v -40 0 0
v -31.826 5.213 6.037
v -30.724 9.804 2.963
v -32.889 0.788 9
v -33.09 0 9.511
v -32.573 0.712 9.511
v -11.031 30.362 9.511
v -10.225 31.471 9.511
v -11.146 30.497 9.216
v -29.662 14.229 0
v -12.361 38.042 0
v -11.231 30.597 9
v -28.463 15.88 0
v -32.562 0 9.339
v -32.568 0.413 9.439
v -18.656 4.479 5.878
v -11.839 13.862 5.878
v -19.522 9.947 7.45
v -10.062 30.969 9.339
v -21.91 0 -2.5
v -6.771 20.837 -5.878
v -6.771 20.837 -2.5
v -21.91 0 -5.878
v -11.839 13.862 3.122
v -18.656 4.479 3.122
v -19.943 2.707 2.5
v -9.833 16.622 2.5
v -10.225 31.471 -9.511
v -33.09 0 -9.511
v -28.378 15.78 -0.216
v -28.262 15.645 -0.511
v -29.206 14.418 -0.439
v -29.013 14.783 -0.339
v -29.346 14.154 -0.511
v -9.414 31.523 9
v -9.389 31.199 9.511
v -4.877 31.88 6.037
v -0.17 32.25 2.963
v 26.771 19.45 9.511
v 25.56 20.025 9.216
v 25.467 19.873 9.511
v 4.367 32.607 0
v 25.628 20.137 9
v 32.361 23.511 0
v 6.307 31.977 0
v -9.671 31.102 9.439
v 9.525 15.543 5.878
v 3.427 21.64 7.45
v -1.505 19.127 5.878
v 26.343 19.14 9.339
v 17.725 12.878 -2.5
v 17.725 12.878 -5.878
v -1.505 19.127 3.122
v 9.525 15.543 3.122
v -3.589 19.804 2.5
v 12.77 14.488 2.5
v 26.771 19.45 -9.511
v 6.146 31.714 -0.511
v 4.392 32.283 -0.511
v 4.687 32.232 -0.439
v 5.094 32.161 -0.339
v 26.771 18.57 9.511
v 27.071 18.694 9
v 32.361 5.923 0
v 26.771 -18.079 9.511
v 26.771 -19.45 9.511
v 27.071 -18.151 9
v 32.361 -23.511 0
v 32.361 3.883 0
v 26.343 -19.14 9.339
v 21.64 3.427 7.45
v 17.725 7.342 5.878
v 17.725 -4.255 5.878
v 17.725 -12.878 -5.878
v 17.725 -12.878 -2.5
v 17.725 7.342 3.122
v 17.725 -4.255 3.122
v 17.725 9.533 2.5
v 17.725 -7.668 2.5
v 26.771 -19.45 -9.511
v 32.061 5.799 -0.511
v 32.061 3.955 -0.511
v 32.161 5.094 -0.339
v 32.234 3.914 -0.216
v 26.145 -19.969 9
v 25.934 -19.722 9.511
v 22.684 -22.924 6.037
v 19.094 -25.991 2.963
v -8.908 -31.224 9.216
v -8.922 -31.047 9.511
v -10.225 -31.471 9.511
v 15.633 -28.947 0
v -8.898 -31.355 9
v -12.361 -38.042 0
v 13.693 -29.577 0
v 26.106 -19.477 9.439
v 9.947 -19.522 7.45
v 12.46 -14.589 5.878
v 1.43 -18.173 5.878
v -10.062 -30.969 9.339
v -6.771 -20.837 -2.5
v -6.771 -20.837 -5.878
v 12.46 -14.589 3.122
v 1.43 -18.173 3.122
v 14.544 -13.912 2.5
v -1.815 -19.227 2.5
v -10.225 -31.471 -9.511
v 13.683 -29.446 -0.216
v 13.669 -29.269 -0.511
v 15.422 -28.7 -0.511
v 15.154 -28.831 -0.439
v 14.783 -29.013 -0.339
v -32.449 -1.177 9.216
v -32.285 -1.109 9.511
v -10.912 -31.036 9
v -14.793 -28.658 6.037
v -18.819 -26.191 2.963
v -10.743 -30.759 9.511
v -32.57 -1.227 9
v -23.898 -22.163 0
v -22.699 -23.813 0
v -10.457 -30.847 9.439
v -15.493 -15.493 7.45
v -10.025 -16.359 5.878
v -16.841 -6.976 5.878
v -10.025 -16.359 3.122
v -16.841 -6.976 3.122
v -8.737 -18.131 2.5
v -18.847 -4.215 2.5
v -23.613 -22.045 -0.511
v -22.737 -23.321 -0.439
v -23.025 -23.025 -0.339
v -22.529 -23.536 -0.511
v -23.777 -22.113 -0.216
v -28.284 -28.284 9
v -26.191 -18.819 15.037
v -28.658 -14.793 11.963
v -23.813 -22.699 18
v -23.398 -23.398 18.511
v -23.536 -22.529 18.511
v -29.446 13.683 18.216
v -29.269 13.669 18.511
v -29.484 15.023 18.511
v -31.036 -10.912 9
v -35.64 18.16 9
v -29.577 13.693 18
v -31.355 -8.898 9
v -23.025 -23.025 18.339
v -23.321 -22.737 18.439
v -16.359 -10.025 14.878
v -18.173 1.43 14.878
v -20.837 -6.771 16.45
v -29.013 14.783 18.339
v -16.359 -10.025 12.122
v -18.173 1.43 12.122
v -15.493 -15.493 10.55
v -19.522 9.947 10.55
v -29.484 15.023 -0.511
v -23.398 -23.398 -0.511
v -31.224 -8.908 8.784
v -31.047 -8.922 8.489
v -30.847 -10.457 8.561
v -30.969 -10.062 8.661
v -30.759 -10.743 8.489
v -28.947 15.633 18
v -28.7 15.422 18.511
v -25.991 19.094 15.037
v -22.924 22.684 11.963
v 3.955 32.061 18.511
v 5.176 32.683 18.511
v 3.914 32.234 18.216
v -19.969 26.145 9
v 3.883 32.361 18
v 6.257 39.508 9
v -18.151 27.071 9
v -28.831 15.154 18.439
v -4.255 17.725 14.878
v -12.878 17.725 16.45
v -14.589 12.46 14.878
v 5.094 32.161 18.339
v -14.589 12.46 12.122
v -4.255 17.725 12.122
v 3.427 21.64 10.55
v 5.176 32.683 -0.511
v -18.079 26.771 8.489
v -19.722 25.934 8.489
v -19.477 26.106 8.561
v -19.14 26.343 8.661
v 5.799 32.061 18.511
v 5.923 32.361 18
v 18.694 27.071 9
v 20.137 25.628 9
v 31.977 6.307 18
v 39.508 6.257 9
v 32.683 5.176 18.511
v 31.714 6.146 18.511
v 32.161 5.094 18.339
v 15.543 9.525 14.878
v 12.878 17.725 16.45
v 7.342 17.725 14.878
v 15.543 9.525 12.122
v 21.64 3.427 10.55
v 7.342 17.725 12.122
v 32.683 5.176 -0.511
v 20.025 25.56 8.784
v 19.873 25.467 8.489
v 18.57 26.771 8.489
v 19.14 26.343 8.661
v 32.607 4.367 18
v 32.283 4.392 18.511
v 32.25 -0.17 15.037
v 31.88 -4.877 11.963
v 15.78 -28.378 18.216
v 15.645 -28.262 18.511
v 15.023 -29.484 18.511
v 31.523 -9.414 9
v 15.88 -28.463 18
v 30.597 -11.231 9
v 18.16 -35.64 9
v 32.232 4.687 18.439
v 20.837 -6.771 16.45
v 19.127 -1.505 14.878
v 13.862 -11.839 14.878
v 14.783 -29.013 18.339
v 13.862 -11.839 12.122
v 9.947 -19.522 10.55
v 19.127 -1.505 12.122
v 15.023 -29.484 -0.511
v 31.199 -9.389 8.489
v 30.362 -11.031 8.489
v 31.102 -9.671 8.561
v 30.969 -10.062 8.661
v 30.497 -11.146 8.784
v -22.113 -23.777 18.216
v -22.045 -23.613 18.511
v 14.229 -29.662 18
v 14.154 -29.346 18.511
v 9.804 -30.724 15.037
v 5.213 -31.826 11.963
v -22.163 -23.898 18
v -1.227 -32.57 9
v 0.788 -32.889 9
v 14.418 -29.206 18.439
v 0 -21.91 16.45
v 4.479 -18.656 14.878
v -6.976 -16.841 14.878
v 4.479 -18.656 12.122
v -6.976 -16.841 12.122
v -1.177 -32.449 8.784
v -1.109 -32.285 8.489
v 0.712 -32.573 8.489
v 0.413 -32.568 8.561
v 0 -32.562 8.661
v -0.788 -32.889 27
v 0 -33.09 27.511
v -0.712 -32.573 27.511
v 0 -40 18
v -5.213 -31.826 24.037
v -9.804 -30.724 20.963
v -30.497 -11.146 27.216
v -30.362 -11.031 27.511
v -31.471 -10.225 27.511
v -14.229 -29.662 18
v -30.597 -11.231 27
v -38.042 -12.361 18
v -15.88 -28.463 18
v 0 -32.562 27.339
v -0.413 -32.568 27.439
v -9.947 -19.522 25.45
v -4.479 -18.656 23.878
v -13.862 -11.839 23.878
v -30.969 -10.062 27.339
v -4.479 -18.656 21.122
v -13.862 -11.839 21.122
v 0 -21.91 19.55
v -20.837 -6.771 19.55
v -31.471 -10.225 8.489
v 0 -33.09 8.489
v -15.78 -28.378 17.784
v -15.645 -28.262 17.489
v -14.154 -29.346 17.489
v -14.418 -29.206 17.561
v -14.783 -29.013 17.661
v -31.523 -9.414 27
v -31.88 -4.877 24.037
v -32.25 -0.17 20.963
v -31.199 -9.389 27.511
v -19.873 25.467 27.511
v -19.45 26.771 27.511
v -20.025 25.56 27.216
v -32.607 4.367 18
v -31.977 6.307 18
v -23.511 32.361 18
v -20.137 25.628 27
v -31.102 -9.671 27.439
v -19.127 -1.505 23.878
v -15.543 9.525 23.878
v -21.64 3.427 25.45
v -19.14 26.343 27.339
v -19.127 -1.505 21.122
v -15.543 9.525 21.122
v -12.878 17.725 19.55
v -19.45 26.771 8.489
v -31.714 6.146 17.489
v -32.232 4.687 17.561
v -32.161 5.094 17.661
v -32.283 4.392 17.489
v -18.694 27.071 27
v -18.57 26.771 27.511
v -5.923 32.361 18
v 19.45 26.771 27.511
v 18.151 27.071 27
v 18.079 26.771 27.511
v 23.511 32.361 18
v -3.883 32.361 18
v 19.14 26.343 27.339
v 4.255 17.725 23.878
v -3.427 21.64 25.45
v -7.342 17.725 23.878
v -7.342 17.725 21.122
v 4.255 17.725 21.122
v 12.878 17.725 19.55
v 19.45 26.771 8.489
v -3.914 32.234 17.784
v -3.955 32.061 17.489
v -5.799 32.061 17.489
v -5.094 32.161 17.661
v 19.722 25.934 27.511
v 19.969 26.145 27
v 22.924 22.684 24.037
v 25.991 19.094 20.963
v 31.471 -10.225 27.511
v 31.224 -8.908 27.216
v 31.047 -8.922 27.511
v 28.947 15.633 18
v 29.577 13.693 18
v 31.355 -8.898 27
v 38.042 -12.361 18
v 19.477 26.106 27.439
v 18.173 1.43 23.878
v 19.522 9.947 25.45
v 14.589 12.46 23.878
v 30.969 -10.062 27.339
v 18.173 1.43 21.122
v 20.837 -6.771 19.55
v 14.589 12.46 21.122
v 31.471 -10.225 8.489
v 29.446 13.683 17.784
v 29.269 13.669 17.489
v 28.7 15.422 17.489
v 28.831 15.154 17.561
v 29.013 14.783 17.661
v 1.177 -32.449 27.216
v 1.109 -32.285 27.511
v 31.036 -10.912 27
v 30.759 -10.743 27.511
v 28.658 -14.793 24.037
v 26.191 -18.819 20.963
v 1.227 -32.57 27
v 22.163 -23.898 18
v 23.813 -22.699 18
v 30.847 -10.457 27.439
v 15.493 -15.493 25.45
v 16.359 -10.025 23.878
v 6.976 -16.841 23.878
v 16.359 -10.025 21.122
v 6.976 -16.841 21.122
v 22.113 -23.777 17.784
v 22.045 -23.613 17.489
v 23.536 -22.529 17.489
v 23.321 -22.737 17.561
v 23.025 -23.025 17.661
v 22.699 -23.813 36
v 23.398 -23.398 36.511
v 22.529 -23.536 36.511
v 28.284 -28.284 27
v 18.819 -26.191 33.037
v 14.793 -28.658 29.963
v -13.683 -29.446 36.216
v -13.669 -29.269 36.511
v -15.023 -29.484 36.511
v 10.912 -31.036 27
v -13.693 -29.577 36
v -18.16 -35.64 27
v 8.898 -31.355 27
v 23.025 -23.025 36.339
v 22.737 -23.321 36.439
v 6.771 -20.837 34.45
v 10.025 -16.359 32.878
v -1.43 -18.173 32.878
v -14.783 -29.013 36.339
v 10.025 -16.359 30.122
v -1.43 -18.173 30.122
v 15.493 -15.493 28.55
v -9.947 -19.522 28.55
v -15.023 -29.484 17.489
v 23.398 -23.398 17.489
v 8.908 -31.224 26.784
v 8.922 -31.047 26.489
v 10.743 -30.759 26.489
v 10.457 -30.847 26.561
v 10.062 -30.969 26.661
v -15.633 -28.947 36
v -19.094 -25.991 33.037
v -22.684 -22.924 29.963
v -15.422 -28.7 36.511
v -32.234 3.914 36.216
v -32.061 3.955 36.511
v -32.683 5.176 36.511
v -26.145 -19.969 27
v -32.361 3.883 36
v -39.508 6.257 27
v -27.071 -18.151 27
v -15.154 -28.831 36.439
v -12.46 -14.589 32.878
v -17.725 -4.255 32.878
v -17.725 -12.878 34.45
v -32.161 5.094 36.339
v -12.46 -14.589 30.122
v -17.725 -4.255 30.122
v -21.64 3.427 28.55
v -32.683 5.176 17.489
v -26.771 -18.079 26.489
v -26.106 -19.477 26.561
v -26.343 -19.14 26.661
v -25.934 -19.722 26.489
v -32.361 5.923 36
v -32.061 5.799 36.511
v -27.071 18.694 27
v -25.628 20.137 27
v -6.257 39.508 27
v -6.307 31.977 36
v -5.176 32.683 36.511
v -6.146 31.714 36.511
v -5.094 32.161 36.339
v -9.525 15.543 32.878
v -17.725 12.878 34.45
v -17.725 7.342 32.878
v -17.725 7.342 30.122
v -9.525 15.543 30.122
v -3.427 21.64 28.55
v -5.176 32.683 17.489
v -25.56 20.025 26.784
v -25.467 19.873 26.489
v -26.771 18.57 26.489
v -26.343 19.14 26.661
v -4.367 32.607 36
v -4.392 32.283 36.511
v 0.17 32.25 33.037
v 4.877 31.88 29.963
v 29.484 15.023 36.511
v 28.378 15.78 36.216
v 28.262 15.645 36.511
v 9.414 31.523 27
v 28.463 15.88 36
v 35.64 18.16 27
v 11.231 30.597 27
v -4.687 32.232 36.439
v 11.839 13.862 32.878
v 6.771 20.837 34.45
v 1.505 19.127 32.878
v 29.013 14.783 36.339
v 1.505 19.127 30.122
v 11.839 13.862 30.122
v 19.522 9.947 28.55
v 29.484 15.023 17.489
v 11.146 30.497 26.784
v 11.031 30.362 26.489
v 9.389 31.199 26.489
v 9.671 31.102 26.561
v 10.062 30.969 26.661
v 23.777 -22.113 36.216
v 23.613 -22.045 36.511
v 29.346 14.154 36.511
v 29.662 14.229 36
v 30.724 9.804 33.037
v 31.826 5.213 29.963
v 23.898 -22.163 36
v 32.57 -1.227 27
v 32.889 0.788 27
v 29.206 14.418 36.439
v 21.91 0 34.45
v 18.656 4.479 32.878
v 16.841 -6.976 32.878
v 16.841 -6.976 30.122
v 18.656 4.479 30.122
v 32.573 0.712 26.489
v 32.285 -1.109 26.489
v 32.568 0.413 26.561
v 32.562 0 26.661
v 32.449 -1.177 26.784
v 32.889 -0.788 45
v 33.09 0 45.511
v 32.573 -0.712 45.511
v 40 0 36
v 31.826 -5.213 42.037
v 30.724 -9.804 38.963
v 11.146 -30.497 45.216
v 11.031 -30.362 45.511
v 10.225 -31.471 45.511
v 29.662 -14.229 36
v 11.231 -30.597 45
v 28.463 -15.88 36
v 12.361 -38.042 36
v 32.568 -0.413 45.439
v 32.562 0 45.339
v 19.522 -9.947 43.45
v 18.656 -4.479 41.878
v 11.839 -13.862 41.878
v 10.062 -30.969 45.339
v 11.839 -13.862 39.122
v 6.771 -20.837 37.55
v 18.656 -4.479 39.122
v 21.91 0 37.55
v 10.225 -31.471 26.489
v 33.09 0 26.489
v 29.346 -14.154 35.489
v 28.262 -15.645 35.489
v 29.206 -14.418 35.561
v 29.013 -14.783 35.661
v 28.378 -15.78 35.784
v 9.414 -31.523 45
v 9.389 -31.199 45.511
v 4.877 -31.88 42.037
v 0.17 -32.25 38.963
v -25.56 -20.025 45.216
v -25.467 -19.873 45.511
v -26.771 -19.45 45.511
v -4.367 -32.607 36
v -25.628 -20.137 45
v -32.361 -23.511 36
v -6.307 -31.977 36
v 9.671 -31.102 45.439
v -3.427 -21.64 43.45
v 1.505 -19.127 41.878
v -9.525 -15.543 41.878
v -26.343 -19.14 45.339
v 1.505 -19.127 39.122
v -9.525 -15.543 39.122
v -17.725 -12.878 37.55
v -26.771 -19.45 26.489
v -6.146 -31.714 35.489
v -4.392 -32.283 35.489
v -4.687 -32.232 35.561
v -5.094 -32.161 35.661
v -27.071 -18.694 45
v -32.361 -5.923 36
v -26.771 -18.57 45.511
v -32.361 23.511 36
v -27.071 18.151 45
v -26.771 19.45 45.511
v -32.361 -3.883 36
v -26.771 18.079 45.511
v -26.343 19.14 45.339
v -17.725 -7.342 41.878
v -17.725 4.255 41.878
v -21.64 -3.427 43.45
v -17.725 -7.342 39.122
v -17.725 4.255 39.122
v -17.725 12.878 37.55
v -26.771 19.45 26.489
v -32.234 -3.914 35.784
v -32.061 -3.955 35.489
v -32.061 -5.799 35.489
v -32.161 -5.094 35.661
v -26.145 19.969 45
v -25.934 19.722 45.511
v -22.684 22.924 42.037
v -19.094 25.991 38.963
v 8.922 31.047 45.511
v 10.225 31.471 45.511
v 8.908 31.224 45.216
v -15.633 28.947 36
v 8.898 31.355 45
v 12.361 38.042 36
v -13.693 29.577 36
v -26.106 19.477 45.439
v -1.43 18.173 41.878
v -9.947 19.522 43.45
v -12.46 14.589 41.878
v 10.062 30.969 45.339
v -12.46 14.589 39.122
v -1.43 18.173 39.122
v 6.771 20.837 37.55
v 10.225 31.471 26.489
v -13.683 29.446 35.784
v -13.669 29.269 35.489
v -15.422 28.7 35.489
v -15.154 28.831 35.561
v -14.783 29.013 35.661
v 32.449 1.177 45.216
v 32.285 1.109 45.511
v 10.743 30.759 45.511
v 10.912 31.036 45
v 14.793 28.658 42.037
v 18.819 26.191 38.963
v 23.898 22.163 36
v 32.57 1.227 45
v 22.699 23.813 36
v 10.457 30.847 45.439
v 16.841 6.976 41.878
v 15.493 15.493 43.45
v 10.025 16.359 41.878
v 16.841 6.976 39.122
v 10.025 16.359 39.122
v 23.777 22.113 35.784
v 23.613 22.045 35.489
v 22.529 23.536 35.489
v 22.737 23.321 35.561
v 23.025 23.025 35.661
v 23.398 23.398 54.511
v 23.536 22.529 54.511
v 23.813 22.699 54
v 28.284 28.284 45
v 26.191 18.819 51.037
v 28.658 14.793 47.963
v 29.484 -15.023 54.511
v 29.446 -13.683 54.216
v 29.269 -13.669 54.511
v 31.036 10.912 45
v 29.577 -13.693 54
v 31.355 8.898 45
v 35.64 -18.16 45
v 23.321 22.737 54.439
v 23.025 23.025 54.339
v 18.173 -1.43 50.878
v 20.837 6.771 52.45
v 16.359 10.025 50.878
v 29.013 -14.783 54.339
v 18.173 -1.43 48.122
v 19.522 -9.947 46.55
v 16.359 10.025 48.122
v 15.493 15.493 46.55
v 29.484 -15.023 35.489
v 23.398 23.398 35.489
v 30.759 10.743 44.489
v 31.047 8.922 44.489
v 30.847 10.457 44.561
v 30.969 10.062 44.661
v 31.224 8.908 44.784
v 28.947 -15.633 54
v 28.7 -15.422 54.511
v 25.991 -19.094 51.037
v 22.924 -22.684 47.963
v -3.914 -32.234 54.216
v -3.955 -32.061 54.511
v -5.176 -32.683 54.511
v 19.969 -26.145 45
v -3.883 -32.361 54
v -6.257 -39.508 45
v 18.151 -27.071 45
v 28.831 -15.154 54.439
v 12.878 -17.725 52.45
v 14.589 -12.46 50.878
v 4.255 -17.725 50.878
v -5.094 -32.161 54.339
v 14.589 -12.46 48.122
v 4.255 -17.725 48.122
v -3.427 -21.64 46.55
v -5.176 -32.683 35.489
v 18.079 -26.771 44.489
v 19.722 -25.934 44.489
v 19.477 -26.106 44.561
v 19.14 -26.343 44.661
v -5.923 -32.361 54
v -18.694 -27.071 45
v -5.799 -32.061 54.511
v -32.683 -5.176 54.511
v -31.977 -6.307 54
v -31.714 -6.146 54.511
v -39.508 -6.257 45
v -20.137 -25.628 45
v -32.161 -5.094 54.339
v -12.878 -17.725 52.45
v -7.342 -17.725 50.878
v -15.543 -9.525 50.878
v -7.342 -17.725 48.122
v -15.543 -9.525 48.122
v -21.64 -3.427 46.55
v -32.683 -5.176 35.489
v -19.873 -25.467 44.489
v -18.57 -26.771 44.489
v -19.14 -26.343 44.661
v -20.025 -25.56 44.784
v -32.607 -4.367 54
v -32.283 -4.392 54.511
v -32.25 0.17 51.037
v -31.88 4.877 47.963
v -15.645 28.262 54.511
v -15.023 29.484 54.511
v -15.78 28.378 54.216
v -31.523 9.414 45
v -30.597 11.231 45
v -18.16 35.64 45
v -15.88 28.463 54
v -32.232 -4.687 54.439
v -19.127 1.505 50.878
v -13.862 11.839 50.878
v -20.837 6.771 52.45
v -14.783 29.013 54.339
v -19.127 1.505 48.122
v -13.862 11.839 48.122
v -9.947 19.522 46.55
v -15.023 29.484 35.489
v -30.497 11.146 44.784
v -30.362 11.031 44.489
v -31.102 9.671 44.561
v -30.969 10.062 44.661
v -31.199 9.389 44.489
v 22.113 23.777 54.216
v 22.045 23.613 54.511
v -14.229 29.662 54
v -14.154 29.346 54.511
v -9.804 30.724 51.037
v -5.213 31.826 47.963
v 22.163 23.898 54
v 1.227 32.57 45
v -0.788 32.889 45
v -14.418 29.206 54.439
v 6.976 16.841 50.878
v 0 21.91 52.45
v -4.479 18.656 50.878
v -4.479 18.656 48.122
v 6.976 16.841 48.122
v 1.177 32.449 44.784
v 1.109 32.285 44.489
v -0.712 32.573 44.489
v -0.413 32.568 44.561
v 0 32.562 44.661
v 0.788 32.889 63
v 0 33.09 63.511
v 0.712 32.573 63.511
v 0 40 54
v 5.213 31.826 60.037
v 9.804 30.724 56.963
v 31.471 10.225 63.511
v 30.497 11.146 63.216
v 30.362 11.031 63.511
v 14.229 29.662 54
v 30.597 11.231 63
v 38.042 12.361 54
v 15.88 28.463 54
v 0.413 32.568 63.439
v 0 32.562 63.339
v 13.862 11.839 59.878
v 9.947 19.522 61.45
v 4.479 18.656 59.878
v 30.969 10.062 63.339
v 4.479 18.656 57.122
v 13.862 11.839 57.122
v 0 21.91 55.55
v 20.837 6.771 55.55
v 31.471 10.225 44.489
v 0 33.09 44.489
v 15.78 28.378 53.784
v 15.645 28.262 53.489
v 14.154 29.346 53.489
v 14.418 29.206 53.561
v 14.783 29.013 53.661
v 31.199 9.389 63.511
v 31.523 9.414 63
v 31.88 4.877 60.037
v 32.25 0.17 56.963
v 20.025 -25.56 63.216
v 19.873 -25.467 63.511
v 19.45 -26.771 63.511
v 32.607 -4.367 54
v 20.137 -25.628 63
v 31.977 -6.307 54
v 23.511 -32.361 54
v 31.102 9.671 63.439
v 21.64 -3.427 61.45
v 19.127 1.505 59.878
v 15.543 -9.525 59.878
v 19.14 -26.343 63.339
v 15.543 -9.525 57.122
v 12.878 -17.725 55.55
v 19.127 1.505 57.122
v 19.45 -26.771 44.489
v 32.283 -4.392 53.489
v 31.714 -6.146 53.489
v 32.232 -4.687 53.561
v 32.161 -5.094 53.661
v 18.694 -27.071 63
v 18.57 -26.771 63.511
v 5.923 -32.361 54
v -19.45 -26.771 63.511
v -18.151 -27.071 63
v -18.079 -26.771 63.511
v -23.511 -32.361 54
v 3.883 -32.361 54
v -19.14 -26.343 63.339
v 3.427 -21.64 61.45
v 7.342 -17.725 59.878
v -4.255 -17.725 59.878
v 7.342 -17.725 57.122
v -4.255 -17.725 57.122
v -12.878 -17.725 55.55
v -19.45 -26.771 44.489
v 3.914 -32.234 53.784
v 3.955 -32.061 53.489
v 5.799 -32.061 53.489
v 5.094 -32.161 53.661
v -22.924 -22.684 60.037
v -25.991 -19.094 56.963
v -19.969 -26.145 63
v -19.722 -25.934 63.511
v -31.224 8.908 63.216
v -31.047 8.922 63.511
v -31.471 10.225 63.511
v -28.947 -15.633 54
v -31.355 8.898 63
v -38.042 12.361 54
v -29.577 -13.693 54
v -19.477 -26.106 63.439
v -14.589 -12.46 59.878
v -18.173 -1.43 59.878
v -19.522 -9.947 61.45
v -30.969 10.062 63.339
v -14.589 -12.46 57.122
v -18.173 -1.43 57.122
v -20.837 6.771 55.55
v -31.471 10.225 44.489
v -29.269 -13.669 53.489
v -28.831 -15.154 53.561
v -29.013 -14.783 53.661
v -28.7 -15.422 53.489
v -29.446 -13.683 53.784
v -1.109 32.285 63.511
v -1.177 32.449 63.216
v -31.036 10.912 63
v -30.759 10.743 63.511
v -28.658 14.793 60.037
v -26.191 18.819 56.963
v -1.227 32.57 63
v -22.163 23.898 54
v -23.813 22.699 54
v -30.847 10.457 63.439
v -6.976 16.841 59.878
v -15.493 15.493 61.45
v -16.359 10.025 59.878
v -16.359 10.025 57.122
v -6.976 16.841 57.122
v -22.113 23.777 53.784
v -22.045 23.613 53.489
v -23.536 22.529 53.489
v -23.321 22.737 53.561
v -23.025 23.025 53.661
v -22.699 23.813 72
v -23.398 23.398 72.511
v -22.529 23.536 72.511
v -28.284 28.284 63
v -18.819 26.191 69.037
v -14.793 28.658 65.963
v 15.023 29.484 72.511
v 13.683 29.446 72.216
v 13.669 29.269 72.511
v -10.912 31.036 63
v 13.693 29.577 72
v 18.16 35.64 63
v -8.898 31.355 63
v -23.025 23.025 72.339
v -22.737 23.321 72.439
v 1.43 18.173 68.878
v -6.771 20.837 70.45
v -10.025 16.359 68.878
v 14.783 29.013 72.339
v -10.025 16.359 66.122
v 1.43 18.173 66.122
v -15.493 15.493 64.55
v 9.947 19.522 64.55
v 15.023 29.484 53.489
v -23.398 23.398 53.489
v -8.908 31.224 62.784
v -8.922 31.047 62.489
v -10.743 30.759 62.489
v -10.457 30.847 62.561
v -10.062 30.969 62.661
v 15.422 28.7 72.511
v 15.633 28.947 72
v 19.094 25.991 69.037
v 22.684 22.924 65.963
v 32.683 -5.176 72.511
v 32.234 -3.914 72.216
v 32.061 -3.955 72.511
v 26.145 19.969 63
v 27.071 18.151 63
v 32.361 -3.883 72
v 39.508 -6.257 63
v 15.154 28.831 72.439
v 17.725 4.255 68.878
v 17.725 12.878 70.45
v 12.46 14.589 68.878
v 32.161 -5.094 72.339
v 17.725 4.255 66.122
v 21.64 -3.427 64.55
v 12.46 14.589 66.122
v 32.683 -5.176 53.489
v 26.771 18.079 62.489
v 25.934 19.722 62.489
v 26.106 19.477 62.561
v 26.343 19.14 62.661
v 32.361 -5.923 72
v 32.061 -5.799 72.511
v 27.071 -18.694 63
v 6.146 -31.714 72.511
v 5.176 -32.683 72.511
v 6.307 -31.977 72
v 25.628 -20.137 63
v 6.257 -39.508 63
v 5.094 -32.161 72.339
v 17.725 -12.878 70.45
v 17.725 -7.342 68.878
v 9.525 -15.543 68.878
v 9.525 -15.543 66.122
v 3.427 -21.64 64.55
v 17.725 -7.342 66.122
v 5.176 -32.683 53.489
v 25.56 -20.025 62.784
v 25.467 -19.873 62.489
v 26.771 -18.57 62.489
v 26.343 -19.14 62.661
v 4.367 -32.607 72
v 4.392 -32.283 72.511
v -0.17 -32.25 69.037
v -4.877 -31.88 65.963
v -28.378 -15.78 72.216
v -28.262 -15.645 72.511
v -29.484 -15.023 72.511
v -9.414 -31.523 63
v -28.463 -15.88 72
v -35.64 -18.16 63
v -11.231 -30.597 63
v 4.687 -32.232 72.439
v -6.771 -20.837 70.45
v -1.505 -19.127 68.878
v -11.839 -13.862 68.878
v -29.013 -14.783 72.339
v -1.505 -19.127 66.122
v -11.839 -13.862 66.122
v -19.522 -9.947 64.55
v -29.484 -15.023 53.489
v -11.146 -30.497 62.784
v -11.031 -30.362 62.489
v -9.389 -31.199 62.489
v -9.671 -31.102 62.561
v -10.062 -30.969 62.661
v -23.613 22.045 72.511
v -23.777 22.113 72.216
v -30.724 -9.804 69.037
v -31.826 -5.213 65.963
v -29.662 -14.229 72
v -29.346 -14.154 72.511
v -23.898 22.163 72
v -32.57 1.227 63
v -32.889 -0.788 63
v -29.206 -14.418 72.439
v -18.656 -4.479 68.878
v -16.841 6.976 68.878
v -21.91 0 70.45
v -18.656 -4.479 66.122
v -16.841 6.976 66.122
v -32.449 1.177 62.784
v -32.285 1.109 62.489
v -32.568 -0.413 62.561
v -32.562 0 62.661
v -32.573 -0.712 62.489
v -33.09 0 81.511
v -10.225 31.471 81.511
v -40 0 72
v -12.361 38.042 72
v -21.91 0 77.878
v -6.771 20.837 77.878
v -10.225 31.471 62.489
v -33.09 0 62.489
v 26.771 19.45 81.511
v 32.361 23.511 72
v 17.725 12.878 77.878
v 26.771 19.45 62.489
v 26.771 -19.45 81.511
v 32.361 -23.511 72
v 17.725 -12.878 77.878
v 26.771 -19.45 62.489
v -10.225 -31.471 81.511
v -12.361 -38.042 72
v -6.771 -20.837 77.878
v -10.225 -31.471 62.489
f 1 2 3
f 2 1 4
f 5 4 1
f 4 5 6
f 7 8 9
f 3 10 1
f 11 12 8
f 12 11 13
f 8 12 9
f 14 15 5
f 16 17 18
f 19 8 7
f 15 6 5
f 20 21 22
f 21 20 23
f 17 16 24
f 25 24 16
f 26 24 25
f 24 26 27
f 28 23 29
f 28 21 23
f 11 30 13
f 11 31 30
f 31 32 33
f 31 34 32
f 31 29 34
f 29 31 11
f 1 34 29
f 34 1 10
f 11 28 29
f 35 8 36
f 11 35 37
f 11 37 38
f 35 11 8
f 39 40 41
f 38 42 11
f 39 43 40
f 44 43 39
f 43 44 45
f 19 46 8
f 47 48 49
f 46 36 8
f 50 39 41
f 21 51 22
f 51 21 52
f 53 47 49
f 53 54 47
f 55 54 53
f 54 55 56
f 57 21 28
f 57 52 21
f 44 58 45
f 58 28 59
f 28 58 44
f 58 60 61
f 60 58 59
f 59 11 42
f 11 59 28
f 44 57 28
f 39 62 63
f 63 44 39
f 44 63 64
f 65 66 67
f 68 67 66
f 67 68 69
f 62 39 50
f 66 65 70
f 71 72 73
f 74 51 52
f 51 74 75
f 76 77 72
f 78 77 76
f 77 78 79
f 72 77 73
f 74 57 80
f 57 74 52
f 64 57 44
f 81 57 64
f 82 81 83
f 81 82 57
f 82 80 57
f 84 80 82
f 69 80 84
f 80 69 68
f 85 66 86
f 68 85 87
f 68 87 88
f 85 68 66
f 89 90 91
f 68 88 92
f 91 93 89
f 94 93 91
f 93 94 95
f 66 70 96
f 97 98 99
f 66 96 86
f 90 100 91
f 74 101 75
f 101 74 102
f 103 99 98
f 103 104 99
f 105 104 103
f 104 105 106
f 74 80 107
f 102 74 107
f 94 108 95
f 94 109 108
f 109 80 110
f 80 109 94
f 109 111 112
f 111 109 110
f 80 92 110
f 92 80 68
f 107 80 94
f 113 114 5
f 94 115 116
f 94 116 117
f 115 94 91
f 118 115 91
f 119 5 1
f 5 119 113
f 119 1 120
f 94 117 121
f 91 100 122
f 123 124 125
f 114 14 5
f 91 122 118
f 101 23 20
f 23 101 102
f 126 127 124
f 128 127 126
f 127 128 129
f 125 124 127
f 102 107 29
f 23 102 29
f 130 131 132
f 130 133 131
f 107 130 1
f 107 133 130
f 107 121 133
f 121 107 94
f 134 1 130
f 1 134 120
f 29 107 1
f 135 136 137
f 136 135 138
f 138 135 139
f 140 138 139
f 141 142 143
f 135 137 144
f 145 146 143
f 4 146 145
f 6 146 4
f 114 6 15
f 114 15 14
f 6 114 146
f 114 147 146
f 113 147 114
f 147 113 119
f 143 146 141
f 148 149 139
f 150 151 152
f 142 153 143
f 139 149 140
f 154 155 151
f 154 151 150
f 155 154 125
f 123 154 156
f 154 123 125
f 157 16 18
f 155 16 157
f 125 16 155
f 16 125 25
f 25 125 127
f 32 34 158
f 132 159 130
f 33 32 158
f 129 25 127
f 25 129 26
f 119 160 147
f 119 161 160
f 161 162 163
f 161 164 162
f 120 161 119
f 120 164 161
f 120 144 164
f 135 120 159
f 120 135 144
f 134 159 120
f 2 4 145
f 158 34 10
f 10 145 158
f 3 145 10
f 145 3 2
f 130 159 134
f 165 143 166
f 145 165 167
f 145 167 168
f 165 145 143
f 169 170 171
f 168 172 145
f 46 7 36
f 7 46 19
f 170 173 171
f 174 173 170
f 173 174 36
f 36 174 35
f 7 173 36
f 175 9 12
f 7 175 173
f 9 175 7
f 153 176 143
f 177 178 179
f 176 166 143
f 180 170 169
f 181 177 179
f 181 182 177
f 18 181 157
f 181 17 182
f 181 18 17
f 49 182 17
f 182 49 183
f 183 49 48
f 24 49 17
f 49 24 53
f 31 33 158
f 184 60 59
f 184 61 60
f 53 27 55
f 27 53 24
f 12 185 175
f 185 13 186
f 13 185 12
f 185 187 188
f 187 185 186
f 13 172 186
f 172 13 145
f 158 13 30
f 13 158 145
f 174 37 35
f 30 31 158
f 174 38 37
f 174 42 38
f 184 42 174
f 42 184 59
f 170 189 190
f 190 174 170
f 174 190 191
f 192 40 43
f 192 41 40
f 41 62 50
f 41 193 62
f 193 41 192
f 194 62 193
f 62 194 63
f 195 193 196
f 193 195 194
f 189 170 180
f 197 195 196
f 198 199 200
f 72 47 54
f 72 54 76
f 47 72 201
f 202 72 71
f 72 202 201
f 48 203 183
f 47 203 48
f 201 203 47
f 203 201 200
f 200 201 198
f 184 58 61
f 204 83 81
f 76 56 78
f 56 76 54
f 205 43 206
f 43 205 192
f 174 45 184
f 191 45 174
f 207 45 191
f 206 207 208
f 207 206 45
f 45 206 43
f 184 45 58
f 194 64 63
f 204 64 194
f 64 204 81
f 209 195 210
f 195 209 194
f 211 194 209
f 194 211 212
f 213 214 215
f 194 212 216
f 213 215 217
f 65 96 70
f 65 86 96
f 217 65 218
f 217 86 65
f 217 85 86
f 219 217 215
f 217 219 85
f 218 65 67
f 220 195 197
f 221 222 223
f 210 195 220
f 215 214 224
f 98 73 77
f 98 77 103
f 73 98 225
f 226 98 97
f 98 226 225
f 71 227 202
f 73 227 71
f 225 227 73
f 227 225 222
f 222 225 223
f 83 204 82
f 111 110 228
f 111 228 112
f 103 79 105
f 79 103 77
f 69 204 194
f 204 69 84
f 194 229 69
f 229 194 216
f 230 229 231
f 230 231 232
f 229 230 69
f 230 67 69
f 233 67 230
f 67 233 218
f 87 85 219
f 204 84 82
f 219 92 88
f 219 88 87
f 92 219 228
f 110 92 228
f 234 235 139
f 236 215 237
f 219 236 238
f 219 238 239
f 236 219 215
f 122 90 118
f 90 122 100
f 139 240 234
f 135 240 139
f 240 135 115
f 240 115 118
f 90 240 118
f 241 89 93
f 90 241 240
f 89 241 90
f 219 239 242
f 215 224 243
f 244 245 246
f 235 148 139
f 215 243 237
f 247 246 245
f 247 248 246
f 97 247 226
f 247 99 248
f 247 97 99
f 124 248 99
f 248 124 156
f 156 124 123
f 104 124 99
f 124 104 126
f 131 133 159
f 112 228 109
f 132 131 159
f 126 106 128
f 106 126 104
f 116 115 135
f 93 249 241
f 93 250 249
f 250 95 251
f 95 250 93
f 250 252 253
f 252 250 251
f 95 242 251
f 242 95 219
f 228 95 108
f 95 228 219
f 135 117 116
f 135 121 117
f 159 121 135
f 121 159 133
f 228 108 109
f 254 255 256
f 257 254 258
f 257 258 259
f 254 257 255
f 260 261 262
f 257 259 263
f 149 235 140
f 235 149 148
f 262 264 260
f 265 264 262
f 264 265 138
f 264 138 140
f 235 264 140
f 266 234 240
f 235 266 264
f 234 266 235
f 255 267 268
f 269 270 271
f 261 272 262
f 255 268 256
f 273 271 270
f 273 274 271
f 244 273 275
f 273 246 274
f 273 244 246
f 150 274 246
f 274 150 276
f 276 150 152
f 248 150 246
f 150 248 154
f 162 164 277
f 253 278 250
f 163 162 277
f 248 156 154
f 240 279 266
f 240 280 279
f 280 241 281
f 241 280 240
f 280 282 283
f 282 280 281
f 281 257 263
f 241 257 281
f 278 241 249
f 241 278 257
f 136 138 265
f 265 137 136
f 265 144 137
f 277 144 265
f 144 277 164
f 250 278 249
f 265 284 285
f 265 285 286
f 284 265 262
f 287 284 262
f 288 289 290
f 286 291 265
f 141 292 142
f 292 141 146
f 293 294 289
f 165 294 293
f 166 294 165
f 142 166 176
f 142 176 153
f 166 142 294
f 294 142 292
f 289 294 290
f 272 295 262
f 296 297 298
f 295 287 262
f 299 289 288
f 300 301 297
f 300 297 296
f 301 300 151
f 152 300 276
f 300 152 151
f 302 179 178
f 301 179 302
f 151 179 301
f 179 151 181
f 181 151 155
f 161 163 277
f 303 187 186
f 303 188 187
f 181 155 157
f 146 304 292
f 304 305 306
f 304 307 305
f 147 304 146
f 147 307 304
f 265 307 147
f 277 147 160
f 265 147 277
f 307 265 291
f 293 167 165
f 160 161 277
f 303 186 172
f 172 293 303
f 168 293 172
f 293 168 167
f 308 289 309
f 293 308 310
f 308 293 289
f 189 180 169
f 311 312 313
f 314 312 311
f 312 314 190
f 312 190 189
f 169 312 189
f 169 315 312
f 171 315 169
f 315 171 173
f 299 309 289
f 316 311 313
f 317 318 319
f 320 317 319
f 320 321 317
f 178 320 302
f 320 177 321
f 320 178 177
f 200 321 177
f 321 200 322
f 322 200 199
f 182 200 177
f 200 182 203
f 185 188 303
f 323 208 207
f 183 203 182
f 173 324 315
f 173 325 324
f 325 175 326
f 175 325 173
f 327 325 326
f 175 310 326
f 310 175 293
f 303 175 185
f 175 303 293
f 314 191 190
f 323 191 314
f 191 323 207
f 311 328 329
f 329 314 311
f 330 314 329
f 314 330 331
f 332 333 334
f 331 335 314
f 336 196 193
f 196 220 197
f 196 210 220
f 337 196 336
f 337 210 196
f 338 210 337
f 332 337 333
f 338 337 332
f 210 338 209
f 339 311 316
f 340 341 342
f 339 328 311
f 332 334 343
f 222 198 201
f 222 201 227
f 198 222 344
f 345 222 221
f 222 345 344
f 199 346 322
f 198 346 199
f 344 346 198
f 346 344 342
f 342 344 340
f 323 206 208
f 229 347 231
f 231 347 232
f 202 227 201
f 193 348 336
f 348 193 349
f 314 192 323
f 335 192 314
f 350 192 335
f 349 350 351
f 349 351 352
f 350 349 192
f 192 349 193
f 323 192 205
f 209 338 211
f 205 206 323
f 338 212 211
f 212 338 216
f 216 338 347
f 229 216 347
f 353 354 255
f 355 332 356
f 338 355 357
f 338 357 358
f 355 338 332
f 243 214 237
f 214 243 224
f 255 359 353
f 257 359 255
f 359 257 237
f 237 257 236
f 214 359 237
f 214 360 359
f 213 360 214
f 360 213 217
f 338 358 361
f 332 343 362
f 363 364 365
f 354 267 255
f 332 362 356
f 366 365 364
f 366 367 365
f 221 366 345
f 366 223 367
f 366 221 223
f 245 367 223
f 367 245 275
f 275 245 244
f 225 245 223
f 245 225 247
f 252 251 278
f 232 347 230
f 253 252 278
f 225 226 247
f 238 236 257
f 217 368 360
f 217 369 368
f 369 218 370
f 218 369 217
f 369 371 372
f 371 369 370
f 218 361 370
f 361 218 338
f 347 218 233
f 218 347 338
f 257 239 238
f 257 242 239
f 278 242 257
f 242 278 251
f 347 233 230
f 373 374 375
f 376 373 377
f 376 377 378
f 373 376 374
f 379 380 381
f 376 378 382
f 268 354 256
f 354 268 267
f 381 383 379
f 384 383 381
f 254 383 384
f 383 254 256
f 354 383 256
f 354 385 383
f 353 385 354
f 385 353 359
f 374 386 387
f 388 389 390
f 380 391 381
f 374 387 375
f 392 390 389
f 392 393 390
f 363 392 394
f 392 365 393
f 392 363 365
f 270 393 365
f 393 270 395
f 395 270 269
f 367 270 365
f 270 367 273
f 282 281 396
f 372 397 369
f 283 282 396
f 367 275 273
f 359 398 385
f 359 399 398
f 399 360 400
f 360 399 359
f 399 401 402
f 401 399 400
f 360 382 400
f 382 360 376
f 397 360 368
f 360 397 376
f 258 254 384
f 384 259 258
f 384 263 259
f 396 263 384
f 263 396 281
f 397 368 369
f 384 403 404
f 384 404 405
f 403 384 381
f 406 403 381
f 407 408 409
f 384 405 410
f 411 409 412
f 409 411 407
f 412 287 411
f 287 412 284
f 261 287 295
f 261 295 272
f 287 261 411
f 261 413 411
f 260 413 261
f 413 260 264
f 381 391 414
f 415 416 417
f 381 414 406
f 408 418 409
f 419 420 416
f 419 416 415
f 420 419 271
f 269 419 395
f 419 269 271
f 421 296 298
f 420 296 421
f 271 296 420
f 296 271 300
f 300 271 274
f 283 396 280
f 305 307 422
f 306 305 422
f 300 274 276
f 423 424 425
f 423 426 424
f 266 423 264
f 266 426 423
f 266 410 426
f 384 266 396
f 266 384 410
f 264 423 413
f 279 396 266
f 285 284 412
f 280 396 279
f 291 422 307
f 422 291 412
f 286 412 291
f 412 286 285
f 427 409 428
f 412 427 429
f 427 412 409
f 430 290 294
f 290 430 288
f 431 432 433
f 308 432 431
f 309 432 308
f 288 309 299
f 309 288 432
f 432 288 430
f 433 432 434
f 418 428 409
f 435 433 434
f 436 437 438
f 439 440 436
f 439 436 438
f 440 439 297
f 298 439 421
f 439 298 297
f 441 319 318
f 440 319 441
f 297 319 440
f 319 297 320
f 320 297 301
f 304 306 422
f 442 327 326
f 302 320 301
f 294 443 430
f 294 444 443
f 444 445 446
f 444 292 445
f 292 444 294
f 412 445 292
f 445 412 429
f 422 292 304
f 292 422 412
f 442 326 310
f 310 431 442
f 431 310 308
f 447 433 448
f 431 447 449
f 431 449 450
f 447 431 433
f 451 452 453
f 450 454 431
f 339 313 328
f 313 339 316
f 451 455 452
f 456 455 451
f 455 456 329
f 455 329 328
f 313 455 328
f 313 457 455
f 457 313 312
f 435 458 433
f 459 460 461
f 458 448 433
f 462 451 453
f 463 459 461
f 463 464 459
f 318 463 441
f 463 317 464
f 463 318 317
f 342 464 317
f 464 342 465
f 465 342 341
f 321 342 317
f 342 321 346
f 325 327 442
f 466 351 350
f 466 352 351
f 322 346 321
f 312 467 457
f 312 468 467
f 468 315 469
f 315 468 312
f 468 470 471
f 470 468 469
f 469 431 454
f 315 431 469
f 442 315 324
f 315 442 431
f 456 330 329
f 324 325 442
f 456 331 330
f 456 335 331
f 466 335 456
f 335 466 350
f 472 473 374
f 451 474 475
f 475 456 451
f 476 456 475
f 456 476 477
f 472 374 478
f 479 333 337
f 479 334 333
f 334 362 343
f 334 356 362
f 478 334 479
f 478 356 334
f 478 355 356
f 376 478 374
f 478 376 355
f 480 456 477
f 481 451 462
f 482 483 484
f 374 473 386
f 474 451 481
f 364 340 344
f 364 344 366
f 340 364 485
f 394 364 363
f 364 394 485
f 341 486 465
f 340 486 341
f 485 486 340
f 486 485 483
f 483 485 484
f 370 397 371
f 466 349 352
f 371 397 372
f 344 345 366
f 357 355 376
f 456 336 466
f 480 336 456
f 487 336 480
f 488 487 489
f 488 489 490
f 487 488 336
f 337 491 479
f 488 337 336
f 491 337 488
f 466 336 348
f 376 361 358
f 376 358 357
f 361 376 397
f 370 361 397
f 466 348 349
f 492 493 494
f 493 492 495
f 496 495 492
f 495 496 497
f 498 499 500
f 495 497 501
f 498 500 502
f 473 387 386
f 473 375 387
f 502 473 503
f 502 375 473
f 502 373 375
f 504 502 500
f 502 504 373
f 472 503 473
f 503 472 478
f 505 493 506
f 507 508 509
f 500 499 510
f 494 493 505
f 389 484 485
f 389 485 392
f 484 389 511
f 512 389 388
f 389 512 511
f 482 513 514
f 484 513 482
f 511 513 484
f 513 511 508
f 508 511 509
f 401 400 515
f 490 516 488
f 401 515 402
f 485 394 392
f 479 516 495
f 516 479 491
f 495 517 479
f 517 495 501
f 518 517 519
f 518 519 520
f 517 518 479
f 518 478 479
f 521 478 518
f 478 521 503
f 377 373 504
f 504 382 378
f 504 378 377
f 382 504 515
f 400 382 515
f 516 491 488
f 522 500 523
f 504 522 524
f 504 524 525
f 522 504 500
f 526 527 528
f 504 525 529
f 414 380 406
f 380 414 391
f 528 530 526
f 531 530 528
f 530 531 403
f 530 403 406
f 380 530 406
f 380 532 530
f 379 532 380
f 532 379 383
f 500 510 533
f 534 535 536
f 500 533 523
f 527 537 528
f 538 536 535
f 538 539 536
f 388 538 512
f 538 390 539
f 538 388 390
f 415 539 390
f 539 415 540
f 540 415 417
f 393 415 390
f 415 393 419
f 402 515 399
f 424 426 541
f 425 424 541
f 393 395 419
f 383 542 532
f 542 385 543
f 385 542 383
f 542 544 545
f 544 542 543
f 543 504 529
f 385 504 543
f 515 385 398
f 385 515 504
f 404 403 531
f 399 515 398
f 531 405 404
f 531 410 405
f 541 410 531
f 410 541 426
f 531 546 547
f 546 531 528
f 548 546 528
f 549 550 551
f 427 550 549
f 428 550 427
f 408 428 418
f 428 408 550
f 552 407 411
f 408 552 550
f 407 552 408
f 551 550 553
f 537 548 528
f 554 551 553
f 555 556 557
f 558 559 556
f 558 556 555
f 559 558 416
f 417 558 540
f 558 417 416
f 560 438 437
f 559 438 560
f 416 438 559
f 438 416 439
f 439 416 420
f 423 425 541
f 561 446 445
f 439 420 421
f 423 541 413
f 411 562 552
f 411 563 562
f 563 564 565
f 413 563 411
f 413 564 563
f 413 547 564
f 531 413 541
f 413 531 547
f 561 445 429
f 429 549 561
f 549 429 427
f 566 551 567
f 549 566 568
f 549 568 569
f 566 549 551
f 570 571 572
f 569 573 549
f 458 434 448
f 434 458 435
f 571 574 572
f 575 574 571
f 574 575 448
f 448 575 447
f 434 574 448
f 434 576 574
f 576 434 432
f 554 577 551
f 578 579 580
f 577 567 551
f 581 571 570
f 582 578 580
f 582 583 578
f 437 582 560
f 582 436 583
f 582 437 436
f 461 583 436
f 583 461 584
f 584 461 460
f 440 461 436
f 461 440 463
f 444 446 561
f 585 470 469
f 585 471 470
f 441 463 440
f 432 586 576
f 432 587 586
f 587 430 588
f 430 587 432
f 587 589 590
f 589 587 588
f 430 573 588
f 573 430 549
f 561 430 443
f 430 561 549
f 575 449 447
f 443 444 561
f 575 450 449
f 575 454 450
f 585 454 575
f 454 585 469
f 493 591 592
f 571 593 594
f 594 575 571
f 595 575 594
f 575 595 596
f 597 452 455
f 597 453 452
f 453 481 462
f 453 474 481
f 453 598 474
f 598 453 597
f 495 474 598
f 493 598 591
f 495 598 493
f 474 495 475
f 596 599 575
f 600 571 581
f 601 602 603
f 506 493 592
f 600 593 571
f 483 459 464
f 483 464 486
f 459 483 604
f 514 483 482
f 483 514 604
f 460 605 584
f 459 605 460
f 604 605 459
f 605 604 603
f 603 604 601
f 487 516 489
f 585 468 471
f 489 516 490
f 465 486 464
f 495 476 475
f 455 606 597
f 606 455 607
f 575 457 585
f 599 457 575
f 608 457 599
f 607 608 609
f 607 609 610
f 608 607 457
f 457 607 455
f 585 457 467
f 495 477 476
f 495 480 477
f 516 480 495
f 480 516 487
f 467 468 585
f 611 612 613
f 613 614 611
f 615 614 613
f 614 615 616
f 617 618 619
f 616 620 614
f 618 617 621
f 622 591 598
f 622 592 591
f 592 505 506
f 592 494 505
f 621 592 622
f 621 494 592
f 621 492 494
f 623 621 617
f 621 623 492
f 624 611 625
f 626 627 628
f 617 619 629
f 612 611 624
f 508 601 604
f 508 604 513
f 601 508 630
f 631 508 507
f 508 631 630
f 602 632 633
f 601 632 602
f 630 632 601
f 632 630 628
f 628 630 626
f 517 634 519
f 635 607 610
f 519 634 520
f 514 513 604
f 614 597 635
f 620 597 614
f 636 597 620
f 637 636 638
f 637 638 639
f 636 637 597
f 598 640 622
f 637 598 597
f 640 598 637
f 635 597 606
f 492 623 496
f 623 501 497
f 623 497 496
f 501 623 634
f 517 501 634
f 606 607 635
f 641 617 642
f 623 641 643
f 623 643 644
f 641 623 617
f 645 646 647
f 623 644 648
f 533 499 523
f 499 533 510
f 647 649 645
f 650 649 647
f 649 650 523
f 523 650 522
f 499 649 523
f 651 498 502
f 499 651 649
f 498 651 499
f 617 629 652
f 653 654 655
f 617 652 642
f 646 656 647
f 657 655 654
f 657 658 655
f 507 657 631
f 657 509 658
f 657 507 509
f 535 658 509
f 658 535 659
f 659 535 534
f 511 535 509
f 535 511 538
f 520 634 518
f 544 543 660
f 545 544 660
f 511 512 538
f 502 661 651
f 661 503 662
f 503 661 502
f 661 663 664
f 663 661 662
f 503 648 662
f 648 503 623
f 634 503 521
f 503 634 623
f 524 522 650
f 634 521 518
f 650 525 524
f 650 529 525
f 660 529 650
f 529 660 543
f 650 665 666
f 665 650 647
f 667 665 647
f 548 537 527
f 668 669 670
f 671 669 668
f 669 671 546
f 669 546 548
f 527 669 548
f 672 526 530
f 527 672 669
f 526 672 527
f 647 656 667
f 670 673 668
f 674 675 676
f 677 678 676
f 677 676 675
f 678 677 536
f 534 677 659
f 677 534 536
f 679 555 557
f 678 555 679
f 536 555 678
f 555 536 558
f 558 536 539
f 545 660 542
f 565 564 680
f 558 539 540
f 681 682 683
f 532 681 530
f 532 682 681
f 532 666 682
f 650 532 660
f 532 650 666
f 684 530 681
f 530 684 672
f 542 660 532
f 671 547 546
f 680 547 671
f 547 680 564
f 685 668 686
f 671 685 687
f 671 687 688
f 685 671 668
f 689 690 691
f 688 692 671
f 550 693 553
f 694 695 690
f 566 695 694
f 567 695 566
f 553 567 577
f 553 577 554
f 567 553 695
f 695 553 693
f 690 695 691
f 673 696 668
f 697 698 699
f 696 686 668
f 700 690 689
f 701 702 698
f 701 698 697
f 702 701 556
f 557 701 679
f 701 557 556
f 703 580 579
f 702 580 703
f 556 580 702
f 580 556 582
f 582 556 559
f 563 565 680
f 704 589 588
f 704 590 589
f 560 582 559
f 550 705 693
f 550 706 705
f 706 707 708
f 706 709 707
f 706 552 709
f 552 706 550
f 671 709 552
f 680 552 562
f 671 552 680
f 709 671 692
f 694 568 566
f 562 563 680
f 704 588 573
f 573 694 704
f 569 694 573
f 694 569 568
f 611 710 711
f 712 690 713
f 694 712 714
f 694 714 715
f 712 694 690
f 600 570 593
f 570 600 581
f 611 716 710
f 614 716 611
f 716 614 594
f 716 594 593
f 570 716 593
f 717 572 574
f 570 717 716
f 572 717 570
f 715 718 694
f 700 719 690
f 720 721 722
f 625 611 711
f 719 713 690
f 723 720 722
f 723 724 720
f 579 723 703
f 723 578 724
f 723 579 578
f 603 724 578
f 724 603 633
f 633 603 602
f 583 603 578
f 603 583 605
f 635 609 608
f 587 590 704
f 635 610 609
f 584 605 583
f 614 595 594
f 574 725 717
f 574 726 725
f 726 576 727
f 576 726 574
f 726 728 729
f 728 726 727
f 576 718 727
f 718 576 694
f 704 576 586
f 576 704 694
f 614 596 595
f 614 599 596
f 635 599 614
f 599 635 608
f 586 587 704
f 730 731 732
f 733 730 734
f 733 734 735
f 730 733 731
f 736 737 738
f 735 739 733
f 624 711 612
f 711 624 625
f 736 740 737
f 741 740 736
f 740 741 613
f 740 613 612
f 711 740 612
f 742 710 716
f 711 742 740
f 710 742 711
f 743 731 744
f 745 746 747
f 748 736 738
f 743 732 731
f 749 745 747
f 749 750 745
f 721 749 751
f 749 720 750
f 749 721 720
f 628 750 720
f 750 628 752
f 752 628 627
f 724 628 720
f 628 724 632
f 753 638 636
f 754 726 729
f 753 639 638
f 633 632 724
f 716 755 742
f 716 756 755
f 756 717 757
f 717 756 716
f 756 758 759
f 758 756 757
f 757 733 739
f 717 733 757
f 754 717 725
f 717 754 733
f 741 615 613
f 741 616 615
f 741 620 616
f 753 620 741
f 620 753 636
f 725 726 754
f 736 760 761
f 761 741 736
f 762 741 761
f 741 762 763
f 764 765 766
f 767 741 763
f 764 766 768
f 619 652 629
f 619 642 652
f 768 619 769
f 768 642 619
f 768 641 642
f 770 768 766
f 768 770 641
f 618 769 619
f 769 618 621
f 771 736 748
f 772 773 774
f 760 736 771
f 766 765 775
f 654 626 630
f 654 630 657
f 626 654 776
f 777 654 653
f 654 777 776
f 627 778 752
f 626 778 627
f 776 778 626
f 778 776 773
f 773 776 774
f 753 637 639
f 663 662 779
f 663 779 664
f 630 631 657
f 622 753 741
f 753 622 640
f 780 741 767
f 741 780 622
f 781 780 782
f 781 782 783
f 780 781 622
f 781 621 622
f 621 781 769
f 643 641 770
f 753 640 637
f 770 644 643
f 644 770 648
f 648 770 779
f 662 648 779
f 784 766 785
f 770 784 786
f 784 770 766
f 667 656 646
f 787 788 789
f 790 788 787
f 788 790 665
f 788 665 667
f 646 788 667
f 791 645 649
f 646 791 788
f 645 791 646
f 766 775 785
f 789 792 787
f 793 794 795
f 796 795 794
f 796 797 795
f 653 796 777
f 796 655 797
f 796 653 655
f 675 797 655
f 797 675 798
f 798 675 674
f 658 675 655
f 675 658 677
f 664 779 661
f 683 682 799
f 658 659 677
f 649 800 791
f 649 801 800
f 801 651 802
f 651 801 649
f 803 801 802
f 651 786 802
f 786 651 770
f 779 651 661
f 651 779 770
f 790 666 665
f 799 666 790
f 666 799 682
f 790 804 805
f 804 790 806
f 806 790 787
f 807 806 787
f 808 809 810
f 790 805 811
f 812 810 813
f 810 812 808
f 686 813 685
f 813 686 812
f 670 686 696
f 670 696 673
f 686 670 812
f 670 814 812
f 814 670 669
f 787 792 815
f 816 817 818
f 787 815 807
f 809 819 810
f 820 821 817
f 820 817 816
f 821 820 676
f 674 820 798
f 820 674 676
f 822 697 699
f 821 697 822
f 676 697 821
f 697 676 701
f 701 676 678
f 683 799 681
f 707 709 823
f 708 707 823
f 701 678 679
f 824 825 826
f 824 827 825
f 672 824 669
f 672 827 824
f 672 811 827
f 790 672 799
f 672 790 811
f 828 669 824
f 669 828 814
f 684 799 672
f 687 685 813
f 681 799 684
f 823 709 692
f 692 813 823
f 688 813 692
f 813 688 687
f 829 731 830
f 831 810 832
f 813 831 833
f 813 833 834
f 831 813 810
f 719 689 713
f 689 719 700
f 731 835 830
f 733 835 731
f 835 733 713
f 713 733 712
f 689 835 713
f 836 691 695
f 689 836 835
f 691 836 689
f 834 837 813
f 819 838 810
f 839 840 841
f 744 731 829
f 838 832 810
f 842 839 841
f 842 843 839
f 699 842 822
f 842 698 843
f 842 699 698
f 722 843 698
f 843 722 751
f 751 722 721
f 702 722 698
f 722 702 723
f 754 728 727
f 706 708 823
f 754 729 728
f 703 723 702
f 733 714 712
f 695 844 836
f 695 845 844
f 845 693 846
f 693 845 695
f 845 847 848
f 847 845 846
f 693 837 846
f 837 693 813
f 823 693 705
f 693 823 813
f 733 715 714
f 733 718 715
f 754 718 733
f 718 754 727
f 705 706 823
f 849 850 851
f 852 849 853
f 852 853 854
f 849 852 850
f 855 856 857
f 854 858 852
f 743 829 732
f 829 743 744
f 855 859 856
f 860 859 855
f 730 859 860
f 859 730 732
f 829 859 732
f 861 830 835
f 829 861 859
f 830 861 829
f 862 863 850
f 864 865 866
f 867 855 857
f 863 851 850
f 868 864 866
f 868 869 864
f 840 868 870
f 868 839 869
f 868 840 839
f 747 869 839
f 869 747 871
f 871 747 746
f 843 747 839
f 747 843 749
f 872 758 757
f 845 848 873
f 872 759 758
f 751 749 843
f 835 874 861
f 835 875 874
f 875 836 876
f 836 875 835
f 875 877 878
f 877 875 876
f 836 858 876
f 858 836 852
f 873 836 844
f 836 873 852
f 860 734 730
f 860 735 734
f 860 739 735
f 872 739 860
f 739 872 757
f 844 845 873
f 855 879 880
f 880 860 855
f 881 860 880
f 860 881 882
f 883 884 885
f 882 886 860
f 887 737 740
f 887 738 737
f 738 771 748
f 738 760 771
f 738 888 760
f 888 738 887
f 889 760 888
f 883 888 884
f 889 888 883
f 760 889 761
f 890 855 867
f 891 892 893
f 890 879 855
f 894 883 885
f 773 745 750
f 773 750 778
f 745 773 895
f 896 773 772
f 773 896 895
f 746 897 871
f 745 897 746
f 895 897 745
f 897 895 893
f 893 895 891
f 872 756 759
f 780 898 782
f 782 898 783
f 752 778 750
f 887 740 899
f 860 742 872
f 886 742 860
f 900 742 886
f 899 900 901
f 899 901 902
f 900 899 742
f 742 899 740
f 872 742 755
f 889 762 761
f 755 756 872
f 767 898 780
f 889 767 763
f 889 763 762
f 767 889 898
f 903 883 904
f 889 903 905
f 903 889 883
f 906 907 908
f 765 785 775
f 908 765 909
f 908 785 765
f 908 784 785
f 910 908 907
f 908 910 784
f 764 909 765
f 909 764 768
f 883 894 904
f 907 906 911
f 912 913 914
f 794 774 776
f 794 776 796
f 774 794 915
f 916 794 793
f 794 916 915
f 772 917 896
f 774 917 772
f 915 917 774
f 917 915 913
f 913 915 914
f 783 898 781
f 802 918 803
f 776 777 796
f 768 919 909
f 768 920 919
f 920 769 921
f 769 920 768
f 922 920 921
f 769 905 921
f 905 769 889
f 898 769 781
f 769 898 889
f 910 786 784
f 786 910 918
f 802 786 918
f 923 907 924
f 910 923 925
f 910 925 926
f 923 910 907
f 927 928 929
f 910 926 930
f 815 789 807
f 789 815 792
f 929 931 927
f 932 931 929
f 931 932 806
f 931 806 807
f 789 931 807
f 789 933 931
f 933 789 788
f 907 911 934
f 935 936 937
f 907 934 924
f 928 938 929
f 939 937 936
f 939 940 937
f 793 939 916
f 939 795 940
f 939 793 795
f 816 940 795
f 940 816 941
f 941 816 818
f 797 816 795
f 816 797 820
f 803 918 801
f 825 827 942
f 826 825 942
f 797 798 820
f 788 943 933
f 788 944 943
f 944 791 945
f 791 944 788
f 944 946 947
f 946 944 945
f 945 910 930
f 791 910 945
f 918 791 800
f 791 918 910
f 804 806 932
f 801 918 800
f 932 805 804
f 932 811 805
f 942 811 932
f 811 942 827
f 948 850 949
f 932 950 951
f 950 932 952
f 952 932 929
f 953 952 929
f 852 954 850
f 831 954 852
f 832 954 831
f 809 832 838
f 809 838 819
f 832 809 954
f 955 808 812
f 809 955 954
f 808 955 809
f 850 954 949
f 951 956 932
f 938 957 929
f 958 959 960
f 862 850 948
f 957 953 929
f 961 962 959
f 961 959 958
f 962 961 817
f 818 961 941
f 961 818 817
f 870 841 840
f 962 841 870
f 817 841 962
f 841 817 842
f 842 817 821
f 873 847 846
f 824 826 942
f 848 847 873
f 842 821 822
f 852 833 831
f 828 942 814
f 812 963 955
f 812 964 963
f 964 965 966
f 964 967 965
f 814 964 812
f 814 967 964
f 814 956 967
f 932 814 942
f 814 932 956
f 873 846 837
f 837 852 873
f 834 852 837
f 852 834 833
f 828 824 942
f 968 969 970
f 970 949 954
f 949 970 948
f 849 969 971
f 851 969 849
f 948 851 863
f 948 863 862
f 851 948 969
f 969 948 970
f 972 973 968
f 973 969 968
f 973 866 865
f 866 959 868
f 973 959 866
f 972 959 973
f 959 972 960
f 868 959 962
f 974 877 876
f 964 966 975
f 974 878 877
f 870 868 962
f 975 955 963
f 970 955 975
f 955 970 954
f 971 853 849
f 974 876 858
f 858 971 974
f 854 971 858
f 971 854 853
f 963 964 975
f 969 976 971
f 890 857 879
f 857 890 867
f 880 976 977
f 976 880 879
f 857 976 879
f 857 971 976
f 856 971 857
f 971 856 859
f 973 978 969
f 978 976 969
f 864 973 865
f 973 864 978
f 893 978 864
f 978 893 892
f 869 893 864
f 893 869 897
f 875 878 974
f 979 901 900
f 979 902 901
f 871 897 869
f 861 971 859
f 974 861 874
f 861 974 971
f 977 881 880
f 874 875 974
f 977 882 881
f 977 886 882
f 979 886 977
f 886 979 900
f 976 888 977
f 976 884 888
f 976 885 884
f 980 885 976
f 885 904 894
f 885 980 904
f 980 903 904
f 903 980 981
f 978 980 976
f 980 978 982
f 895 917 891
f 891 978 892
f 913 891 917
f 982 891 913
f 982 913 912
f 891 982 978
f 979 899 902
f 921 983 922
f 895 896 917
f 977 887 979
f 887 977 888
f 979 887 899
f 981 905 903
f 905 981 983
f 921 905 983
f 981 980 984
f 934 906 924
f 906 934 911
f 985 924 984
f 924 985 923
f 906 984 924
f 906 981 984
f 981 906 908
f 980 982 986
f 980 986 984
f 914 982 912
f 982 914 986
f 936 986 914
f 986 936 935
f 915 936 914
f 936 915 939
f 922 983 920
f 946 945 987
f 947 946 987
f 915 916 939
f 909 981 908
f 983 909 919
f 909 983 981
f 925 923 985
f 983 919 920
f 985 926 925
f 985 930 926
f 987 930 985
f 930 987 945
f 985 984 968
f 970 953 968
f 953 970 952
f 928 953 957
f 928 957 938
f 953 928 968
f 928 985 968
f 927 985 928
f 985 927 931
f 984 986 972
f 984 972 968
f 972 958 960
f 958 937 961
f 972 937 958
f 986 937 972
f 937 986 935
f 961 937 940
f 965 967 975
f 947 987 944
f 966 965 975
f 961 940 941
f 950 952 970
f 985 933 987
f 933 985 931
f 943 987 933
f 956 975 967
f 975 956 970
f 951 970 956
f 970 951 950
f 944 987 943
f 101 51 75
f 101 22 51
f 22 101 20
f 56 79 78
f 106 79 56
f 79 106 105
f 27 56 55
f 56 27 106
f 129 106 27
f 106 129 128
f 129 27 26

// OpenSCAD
//Number of Rings
no_of_rings=8; // [3:12]

//Width of Donut Ring (in mm)
donut_width=30; // [20:50]

//Radius of Donut Ring (in mm)
donut_radius=10; // [5:15]

//Density between Donut Rings
donut_density=9; // [1:12]

//$fn Value of Cup
sharpness=5; // [3:100]


module ring(){
    rotate_extrude(convexity = 10, $fn = sharpness)
    translate([donut_width, 0, 0])
    circle(r = donut_radius);
}

module bottom(){
    linear_extrude(height = 5,center = true,convexity = 10,twist = 0)
    circle(r = donut_width,$fn = sharpness);
}
module cup(){
    for(p = [0:no_of_rings]){
        translate([0,0,donut_density*p])
        rotate([0,0,p*(360/no_of_rings)])
        ring();
    }
    bottom();
}


cup();
